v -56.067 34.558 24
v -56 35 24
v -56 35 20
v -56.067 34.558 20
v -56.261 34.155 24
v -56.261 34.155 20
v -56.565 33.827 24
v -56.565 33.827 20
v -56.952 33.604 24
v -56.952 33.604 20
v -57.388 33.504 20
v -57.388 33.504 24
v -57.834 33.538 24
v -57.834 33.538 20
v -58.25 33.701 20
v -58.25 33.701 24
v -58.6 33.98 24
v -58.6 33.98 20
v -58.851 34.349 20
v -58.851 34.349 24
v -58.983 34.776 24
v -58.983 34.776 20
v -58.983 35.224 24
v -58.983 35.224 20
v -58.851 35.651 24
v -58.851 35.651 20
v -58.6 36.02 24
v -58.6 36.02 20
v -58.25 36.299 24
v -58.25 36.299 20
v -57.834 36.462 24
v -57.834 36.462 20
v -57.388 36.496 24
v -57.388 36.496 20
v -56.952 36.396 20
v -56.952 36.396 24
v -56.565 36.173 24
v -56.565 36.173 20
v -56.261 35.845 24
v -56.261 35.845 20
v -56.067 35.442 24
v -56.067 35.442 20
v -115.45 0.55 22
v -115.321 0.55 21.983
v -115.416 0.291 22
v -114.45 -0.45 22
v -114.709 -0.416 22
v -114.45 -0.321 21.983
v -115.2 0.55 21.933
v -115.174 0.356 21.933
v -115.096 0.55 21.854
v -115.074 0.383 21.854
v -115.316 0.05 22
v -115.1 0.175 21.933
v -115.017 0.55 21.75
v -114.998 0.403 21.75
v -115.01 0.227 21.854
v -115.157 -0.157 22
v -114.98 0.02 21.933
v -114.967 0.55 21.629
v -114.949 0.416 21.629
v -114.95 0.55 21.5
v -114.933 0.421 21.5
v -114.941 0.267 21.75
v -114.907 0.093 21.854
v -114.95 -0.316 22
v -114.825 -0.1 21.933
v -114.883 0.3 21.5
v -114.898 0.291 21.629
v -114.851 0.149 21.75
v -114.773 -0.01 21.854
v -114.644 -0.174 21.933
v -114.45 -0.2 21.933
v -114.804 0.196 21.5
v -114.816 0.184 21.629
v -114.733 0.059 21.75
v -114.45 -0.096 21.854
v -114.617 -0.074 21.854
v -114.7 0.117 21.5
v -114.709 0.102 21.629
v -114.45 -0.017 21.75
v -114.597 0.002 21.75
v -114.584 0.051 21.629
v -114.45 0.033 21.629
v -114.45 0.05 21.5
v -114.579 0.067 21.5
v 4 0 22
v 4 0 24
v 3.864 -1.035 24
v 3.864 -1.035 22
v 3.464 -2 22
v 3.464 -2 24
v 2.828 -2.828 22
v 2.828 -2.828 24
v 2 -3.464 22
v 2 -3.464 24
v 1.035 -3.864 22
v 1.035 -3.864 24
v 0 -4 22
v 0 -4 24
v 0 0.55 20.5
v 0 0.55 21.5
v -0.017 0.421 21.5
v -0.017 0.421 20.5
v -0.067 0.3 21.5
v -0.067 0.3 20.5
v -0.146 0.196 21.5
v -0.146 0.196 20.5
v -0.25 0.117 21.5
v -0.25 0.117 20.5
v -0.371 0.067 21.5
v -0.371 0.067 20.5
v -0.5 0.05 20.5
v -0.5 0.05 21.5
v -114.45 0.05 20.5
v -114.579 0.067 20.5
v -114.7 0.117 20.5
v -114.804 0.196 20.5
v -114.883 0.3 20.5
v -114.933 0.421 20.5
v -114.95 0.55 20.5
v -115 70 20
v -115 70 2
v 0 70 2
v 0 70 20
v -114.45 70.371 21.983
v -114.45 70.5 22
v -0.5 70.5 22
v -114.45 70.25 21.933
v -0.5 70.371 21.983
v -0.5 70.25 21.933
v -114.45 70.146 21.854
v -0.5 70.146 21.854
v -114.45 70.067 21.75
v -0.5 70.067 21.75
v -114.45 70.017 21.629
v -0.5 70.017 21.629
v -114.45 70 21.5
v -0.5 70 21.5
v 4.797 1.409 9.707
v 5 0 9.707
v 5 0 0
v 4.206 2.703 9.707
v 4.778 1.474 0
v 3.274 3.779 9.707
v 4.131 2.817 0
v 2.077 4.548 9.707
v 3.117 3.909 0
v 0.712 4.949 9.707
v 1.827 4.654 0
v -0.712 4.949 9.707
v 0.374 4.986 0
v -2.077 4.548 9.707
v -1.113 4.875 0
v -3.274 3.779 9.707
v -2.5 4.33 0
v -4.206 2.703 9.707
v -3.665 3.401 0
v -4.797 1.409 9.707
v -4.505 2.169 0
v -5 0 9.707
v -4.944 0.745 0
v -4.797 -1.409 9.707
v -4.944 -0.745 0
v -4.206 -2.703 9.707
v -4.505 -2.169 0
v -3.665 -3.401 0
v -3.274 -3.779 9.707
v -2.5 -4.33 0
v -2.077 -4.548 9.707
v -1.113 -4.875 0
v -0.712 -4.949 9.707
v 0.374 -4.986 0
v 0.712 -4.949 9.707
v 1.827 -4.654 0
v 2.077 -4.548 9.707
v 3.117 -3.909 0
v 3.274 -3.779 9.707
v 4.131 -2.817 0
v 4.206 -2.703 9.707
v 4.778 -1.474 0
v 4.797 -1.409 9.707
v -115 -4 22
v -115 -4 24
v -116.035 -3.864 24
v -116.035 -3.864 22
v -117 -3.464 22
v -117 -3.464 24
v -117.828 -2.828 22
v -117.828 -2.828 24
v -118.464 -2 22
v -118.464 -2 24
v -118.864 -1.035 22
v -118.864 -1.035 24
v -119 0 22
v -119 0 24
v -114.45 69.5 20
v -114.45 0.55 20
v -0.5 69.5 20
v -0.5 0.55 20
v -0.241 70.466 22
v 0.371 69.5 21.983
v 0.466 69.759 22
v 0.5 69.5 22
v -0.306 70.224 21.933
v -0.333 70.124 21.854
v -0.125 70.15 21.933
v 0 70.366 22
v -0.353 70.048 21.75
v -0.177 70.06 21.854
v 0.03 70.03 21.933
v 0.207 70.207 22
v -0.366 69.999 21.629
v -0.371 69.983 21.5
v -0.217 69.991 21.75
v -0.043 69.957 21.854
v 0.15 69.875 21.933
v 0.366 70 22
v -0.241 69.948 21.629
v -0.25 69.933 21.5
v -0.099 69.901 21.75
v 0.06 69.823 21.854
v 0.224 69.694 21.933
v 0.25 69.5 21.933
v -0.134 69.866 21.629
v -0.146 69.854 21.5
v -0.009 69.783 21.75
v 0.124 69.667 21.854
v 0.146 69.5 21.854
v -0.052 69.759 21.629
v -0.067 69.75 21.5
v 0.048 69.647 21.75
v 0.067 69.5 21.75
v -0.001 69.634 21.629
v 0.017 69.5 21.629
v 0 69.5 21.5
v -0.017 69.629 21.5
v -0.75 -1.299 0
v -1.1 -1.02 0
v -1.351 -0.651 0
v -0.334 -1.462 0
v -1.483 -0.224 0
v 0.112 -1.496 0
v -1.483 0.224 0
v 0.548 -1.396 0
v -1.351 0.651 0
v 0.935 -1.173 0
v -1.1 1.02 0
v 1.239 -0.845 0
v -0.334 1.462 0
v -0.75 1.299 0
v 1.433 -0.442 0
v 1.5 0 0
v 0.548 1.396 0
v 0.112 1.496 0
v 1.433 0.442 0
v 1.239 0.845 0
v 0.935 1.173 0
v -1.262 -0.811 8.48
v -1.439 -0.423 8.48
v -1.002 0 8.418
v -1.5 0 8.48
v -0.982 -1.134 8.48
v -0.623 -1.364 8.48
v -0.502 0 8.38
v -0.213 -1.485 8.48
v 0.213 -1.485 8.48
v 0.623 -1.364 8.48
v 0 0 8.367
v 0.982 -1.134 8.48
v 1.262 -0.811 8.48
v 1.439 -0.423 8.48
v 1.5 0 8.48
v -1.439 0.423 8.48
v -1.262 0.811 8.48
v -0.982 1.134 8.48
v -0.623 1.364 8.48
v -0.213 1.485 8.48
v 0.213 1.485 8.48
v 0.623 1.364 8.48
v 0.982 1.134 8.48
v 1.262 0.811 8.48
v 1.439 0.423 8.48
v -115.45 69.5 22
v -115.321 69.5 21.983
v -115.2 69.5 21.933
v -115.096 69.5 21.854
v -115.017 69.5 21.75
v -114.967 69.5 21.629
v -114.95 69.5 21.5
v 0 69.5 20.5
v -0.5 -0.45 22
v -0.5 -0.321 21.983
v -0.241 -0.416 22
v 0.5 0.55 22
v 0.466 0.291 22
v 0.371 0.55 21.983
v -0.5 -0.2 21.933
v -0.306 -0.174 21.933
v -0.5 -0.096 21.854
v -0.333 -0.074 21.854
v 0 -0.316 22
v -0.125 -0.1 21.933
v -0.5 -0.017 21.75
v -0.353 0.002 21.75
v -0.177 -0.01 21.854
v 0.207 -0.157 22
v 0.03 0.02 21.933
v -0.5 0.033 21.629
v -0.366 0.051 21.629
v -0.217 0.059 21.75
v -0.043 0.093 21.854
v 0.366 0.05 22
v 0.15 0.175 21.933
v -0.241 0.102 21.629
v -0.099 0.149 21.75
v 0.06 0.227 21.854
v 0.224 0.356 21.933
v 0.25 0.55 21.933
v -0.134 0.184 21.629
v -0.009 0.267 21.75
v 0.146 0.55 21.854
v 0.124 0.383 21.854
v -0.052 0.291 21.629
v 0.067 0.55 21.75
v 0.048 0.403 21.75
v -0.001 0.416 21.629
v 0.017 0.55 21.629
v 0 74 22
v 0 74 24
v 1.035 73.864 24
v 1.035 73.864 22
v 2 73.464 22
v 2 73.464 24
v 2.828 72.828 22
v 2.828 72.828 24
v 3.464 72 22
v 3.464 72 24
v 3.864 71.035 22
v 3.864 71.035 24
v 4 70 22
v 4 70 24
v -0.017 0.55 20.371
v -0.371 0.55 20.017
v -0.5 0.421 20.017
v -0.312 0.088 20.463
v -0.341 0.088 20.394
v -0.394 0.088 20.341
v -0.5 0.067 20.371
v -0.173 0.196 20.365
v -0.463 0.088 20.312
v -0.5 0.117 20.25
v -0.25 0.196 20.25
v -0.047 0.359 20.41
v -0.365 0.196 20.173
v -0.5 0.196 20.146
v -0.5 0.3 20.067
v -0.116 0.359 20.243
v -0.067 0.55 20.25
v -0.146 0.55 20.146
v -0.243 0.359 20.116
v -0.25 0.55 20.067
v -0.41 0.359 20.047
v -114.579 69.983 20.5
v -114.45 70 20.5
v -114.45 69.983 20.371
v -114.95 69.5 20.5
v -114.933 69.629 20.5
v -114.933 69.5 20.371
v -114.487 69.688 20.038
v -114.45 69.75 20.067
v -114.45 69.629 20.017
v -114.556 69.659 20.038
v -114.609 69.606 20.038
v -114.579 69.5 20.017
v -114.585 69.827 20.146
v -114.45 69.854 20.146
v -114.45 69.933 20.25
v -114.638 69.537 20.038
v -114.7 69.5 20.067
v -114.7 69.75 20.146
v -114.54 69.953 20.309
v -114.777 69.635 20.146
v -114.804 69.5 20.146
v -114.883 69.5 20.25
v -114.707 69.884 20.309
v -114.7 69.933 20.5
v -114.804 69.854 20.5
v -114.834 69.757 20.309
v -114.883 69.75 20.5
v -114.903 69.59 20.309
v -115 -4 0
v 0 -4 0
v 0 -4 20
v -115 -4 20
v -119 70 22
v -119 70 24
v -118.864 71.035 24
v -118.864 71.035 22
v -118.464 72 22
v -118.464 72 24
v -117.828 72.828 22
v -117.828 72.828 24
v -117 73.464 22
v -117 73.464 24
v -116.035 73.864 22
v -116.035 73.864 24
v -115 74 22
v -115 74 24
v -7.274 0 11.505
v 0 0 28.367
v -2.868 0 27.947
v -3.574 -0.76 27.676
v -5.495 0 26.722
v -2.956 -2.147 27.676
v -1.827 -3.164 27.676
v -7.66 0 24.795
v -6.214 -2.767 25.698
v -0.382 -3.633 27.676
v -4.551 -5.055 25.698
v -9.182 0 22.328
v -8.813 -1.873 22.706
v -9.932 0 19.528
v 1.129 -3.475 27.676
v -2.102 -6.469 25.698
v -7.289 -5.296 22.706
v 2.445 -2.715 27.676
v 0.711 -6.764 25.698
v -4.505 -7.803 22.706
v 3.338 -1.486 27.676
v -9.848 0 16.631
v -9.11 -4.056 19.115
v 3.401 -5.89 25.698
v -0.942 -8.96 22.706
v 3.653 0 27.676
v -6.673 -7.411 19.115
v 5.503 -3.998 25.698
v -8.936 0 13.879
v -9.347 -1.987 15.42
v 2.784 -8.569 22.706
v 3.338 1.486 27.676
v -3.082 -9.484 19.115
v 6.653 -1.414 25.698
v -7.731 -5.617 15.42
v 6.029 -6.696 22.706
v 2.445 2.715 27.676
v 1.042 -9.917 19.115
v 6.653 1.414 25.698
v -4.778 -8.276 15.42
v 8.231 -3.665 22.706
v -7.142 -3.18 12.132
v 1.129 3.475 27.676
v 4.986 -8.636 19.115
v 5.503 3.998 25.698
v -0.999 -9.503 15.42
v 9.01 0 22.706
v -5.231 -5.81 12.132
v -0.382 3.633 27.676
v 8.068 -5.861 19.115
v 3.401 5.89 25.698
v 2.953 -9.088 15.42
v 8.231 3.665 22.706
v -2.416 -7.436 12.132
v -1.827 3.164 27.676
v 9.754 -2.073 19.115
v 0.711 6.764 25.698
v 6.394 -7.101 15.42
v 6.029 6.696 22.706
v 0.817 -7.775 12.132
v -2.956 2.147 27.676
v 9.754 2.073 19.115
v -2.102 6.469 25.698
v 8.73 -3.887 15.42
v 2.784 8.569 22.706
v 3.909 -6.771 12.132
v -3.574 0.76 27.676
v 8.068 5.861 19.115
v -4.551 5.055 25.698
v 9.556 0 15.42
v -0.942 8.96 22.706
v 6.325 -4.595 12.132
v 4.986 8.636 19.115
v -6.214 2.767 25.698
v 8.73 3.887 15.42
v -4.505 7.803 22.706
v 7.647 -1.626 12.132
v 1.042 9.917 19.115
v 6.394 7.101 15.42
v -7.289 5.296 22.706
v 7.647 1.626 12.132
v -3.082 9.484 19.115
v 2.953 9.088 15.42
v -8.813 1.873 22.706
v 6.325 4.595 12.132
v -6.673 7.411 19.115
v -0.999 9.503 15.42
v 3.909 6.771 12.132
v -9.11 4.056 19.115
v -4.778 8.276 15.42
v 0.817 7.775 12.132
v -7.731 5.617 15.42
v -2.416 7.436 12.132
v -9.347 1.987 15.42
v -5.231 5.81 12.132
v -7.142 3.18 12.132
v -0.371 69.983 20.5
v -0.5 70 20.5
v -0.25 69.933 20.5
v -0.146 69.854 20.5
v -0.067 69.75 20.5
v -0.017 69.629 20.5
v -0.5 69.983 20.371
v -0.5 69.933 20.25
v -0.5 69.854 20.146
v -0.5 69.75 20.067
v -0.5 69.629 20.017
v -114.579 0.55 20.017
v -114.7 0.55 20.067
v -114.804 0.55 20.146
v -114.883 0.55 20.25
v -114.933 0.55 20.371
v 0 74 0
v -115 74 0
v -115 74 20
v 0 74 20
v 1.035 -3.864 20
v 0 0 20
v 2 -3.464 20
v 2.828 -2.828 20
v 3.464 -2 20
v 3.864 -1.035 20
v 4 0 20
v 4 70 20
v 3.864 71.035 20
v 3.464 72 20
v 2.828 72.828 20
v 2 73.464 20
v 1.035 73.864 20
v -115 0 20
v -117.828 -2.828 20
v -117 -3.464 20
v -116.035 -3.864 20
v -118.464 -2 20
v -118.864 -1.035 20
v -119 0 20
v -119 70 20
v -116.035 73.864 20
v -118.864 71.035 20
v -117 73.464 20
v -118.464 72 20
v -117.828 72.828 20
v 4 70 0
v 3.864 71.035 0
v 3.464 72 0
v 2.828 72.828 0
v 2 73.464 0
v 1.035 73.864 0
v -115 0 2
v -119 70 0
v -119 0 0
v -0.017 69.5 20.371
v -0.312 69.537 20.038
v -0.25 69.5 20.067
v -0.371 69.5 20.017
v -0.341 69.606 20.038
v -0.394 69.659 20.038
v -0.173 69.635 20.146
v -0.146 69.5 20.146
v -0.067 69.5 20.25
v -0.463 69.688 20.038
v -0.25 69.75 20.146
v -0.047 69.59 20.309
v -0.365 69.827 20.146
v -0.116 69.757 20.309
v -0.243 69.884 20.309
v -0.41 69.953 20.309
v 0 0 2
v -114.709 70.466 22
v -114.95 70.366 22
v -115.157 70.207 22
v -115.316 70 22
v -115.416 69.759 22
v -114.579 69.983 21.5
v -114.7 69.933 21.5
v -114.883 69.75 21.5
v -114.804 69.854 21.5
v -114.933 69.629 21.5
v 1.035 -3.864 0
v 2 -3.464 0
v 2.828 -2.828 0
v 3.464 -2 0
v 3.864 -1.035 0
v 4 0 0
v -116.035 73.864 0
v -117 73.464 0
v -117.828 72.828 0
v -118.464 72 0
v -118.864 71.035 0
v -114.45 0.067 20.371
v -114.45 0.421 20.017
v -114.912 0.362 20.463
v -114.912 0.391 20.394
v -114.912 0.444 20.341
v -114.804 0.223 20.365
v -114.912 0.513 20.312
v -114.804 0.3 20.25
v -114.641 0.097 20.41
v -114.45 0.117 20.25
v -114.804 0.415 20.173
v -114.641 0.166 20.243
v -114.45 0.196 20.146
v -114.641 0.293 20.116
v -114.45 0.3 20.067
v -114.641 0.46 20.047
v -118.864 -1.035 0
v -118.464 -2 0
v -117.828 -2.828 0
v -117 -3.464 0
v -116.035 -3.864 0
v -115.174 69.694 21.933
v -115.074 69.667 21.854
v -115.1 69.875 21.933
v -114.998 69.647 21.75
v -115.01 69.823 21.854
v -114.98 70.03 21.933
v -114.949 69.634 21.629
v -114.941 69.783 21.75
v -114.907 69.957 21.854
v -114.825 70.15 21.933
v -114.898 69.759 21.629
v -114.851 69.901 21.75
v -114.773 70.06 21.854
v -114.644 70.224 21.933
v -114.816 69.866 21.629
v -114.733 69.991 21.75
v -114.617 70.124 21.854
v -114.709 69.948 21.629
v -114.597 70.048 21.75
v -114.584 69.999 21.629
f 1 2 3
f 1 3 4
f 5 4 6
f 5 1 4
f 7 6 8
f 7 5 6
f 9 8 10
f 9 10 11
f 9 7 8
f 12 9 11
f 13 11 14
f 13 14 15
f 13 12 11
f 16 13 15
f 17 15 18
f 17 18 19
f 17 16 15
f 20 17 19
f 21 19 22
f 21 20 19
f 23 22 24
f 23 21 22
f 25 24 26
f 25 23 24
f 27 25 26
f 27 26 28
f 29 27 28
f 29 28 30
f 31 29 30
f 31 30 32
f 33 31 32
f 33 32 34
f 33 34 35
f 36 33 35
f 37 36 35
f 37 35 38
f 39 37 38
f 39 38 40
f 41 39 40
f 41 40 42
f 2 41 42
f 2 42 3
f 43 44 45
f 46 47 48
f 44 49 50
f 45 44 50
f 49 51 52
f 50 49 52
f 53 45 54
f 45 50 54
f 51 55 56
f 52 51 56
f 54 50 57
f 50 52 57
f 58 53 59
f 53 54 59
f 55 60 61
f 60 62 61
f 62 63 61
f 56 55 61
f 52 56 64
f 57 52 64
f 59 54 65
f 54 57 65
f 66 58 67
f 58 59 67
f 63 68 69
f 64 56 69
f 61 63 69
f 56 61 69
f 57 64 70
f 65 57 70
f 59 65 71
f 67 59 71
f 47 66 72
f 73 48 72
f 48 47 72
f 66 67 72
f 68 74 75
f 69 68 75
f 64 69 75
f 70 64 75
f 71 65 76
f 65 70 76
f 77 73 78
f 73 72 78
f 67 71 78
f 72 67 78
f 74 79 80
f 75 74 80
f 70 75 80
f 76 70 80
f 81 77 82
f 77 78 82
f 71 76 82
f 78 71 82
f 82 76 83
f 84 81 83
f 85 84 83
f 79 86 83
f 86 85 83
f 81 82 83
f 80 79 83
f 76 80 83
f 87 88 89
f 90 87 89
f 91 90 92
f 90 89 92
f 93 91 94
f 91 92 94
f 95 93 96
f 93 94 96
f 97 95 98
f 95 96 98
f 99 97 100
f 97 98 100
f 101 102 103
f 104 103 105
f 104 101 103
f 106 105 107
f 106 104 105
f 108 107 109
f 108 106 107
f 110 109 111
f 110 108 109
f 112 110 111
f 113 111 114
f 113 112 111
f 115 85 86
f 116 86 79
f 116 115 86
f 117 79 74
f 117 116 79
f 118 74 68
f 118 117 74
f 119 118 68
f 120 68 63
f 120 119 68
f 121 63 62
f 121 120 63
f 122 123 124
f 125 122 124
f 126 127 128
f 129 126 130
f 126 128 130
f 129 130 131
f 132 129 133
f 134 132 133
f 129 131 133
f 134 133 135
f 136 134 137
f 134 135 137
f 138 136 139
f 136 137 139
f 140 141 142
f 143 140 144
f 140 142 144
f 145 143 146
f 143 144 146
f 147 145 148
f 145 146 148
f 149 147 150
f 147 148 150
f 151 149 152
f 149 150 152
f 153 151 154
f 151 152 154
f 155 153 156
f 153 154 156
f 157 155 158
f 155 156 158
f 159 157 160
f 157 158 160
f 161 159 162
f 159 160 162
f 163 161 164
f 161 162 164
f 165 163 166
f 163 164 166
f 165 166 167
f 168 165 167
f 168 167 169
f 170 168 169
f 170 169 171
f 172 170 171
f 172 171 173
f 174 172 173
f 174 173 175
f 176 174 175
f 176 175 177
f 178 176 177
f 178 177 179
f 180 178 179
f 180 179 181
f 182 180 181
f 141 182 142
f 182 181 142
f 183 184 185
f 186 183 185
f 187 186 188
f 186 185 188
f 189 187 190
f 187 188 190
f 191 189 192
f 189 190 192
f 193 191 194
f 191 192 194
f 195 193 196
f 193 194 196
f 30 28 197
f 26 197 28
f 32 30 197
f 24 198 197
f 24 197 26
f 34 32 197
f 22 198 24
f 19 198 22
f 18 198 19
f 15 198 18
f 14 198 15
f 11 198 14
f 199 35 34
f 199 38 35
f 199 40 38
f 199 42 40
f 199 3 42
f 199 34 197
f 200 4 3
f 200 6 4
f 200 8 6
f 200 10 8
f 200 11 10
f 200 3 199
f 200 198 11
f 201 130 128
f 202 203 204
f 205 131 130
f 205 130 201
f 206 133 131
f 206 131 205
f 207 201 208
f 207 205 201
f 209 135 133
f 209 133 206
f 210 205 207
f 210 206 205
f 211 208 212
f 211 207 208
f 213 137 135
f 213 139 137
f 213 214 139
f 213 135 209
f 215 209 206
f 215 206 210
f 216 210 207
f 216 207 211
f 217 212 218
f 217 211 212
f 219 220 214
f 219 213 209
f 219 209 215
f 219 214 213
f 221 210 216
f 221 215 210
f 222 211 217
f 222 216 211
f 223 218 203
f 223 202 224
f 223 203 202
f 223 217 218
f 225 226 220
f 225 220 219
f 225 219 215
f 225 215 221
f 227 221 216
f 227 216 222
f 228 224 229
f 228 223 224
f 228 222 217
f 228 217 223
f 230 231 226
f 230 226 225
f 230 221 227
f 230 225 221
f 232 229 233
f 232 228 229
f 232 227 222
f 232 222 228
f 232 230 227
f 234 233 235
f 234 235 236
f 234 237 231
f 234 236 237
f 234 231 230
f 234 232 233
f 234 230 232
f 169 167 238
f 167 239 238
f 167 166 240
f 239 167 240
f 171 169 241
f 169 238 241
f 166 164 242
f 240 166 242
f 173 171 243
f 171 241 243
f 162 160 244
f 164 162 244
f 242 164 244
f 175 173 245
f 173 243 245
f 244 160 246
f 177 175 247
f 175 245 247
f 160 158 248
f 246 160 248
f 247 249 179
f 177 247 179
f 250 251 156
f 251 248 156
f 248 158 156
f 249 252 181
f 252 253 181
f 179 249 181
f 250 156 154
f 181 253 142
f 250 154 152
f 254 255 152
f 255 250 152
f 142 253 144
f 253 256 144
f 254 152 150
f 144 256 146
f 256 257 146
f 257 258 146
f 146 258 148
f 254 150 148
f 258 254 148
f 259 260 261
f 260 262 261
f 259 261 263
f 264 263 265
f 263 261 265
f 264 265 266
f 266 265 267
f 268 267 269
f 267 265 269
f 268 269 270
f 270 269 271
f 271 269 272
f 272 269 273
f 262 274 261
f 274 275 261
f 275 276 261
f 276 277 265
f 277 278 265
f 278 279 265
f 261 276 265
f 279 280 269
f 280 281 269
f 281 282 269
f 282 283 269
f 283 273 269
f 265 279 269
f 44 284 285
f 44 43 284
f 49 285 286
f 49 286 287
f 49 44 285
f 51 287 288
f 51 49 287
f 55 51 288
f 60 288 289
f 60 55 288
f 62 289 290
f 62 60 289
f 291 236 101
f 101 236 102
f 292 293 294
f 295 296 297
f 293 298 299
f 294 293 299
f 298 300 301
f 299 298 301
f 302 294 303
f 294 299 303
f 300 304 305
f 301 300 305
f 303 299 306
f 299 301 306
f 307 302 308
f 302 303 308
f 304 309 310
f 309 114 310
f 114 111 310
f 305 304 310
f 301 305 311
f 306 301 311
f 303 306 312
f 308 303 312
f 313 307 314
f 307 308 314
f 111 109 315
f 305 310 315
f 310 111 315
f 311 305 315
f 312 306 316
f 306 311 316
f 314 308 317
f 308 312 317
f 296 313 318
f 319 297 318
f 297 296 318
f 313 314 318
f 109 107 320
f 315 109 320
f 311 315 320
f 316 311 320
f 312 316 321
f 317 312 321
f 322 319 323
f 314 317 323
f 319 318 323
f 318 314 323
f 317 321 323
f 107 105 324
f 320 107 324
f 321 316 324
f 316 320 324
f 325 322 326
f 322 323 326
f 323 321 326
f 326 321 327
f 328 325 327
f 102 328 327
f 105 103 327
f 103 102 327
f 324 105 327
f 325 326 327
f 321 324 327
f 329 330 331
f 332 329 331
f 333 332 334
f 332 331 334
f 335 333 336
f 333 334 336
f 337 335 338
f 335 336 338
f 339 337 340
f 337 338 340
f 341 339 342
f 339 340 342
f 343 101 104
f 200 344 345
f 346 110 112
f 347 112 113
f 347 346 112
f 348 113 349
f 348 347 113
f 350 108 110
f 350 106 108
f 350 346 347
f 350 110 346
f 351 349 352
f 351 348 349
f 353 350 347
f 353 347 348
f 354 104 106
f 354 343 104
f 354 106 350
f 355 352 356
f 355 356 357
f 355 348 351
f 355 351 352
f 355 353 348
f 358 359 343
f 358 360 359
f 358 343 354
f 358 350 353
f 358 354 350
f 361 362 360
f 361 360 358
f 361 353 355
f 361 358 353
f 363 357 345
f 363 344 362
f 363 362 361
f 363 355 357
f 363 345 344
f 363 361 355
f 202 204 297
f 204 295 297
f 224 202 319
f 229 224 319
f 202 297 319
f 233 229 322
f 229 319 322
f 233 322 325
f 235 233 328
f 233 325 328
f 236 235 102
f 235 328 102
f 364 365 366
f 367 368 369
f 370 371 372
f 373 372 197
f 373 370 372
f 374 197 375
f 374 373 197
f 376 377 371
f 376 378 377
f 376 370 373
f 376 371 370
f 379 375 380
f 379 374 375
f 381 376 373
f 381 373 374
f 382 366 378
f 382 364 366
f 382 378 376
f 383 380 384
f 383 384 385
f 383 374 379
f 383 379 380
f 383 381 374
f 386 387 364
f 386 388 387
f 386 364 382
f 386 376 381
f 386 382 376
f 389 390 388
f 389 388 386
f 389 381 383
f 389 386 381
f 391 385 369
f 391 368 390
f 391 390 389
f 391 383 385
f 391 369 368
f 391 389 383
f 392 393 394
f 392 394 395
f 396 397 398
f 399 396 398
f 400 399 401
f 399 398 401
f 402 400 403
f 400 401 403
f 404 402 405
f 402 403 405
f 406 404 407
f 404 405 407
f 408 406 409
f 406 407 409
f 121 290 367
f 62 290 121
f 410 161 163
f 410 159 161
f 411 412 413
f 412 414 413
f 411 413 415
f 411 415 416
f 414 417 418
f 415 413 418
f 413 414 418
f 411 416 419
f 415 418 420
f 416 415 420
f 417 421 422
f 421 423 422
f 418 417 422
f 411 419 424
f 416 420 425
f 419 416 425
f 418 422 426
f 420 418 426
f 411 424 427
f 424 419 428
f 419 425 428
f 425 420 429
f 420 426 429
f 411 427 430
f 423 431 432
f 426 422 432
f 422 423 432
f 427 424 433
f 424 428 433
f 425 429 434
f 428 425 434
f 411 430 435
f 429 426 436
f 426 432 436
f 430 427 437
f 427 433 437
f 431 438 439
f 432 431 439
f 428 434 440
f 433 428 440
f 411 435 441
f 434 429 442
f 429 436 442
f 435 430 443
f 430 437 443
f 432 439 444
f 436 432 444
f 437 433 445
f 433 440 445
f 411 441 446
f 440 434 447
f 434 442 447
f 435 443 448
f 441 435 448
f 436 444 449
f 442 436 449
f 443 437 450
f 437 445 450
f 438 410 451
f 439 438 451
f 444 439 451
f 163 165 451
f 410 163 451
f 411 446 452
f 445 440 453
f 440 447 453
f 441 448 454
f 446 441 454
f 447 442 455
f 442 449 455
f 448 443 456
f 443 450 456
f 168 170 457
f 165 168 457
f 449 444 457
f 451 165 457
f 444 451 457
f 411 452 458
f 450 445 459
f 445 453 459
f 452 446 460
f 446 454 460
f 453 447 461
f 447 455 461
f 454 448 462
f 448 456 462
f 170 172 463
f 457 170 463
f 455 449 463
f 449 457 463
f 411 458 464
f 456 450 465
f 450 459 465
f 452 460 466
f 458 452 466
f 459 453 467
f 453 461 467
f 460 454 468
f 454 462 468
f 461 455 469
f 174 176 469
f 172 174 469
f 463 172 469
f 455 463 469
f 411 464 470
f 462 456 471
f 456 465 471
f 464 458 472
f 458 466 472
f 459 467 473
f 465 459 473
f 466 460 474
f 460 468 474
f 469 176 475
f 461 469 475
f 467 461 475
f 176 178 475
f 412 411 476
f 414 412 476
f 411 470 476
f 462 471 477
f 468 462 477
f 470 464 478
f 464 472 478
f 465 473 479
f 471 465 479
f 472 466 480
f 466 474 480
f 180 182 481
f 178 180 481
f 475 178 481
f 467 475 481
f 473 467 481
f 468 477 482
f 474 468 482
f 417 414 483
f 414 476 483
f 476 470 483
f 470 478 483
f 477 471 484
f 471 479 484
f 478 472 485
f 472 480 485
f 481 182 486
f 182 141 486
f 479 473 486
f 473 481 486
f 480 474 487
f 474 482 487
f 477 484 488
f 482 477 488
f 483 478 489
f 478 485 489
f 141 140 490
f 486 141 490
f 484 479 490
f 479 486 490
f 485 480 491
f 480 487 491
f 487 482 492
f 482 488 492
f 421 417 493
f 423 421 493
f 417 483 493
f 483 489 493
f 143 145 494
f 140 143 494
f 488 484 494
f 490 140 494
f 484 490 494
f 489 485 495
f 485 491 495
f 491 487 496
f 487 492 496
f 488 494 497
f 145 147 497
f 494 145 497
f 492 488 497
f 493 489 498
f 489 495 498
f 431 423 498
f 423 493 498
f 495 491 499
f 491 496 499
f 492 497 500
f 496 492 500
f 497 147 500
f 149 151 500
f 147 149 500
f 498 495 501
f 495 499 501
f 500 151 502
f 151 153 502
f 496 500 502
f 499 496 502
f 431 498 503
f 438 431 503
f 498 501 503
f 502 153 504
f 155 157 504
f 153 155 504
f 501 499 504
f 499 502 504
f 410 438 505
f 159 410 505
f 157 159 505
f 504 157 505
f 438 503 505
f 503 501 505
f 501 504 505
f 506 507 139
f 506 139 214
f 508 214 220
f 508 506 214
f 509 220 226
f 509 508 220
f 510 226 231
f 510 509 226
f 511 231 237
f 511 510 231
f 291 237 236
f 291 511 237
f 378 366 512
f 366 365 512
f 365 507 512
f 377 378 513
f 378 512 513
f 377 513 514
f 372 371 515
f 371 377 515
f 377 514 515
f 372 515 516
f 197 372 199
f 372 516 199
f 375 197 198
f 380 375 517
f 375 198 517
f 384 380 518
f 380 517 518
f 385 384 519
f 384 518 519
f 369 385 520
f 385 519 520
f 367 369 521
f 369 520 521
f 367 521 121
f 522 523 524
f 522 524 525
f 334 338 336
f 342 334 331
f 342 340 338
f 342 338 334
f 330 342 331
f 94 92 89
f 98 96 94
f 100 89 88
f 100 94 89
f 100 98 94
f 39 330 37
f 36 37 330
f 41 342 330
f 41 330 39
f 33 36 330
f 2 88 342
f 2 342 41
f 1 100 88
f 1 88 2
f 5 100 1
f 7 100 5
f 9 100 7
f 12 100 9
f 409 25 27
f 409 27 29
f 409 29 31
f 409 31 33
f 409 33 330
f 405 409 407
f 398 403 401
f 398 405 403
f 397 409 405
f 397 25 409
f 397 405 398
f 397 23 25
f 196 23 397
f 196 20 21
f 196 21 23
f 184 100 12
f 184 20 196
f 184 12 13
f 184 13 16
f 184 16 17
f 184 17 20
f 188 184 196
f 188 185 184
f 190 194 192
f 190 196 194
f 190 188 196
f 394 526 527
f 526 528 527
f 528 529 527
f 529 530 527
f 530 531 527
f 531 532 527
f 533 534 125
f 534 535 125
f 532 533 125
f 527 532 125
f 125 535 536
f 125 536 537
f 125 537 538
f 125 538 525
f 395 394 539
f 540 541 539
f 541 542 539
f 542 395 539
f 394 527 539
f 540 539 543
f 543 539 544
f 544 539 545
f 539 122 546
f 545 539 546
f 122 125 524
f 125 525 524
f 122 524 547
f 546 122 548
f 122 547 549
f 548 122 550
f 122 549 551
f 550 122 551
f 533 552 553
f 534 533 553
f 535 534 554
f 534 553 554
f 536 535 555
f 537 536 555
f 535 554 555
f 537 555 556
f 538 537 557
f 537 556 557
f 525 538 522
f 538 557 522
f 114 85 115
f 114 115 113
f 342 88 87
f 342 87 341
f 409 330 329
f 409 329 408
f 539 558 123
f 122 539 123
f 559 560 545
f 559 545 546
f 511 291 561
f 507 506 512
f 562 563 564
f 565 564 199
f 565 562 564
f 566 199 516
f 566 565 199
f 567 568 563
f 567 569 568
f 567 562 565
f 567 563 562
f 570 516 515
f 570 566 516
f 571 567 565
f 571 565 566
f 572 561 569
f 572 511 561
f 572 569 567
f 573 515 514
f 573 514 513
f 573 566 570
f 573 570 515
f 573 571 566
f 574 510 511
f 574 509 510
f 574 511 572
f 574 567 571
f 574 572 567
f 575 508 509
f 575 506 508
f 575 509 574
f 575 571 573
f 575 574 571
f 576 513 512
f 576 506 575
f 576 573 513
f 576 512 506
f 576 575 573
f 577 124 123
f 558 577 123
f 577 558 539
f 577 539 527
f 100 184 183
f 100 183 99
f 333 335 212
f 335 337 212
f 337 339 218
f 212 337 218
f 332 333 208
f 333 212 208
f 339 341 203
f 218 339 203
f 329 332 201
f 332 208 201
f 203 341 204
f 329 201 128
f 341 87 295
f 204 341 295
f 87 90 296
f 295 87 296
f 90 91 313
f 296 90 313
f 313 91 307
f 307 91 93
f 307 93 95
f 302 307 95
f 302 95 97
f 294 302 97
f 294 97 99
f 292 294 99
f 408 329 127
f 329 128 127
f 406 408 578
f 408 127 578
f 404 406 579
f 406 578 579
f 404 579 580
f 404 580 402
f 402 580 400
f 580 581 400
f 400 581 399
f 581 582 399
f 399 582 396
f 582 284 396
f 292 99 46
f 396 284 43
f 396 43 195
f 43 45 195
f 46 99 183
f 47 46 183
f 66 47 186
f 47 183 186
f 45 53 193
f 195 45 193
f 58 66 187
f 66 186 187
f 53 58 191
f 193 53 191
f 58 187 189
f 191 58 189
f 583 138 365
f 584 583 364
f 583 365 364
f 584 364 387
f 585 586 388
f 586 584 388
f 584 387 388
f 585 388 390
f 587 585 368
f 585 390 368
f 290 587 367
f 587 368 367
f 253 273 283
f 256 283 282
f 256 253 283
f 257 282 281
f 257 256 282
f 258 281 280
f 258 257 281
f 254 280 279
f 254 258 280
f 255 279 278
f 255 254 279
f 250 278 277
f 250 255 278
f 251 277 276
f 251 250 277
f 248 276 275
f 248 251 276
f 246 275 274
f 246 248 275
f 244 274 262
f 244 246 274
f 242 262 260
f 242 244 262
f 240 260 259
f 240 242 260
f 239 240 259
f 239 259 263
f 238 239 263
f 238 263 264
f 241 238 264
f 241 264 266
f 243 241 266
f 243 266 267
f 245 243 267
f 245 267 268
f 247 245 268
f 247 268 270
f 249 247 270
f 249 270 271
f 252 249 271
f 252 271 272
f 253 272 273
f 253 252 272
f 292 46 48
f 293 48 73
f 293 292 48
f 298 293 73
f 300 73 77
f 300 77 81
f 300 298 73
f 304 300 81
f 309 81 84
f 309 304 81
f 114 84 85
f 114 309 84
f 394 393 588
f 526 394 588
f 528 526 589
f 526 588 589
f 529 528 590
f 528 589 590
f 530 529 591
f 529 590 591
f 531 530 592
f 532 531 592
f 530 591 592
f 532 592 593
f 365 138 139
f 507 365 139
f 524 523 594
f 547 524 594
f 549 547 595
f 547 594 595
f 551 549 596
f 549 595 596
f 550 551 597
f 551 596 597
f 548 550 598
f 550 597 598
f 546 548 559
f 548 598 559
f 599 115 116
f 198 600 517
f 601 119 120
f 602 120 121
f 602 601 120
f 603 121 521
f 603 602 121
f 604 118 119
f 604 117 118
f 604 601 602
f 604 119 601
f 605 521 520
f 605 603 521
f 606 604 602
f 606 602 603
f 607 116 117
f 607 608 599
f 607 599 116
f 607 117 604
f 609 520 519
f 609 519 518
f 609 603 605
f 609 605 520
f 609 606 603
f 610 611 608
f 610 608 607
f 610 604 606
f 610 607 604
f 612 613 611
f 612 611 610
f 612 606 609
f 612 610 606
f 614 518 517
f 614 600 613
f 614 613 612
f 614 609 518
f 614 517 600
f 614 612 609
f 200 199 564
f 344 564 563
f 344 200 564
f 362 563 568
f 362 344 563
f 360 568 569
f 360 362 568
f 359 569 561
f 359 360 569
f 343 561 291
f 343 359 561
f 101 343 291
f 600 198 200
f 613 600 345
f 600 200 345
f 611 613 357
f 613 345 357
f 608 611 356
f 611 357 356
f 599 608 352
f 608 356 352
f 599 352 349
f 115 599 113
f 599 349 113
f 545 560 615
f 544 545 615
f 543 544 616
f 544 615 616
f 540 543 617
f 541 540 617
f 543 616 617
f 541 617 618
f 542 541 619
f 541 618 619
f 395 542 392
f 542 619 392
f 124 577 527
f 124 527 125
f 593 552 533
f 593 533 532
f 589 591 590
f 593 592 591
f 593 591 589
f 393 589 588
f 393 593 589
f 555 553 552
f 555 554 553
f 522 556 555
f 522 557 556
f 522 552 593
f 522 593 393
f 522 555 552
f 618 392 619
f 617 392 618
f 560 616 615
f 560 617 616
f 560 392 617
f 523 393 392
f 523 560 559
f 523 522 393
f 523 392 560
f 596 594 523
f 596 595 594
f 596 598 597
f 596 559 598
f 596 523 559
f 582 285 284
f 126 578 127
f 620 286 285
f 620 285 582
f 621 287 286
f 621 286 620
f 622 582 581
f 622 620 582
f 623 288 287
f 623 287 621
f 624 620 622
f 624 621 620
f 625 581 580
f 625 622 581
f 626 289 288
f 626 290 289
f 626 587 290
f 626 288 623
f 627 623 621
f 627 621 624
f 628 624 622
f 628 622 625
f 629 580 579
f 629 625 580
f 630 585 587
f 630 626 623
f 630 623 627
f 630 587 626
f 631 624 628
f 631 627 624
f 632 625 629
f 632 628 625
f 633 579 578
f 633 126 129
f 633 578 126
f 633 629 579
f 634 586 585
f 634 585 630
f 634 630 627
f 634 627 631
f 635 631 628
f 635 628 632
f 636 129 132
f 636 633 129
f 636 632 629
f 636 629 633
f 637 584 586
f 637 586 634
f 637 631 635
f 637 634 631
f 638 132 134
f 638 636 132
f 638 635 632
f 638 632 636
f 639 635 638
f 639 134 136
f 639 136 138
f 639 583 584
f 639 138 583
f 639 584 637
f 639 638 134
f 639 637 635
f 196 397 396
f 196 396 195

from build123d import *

# Parameters (mm, degrees)
SKETCH_W                = 115
SKETCH_H                = 70
PAD_DEPTH               = 20
PAD001_DEPTH            = 2
SKETCH002_R             = 1.5
PAD002_DEPTH            = 2
SKETCH003_W             = 114.95
SKETCH003_H             = 69.95
SKETCH003_R             = 1.5
PAD003_DEPTH            = 4
FILLET_R                = 0.5
BODY001_PLACEMENT_ANGLE = 180
SKETCH004_R             = 5
SKETCH004_R_2           = 1.5
PAD004_DEPTH            = 10


with BuildPart() as body:
    # Sketch → Pad (new body)
    with BuildSketch(Plane.XY):
        with BuildLine():
            Line((-115, 74), (0, 74))
            ThreePointArc((4, 70), (2.828427, 72.828427), (0, 74))
            Line((4, 70), (4, 0))
            ThreePointArc((0, -4), (2.828427, -2.828427), (4, 0))
            Line((0, -4), (-115, -4))
            ThreePointArc((-119, 0), (-117.828427, -2.828427), (-115, -4))
            Line((-119, 0), (-119, 70))
            ThreePointArc((-115, 74), (-117.828427, 72.828427), (-119, 70))
        make_face()
        with Locations((-57.5, 35)):
            Rectangle(SKETCH_W, SKETCH_H, mode=Mode.SUBTRACT)
    extrude(amount=PAD_DEPTH)

    # Sketch001 → Pad001 (join)
    with BuildSketch(Plane.XY):
        with BuildLine():
            Line((-115, 74), (0, 74))
            ThreePointArc((4, 70), (2.828427, 72.828427), (0, 74))
            Line((4, 70), (4, 0))
            ThreePointArc((0, -4), (2.828427, -2.828427), (4, 0))
            Line((0, -4), (-115, -4))
            ThreePointArc((-119, 0), (-117.828427, -2.828427), (-115, -4))
            Line((-119, 0), (-119, 70))
            ThreePointArc((-115, 74), (-117.828427, 72.828427), (-119, 70))
        make_face()
    extrude(amount=PAD001_DEPTH)


with BuildPart() as body001cover:
    # Sketch002 → Pad002 (new body)
    with BuildSketch(Plane.XY):
        with BuildLine():
            Line((-115, 74), (0, 74))
            ThreePointArc((4, 70), (2.828427, 72.828427), (0, 74))
            Line((4, 70), (4, 0))
            ThreePointArc((0, -4), (2.828427, -2.828427), (4, 0))
            Line((0, -4), (-115, -4))
            ThreePointArc((-119, 0), (-117.828427, -2.828427), (-115, -4))
            Line((-119, 0), (-119, 70))
            ThreePointArc((-115, 74), (-117.828427, 72.828427), (-119, 70))
        make_face()
        with Locations((-57.5, 35)):
            Circle(SKETCH002_R, mode=Mode.SUBTRACT)
    extrude(amount=PAD002_DEPTH)

    # Sketch003 → Pad003 (join)
    with BuildSketch(Plane.XY):
        with Locations((-57.475, 34.975)):
            Rectangle(SKETCH003_W, SKETCH003_H)
        with Locations((-57.5, 35)):
            Circle(SKETCH003_R, mode=Mode.SUBTRACT)
    extrude(amount=PAD003_DEPTH)

    # Fillet
    fillet_edges = [body001cover.edges().sort_by_distance(p)[0] for p in [
        (0, 34.975, 2),
        (0, 0, 3),
        (0, 34.975, 4),
        (0, 69.95, 3),
        (-57.475, 69.95, 2),
        (-57.475, 69.95, 4),
        (-114.95, 69.95, 3),
        (-57.475, 0, 2),
        (-114.95, 0, 3),
        (-57.475, 0, 4),
        (-114.95, 34.975, 2),
        (-114.95, 34.975, 4),
    ]]
    fillet(fillet_edges, radius=FILLET_R)


with BuildPart() as body001cover_1:
    # Body001 placement: moved
    add(body001cover.part.moved(Location((0, 70, 24))).rotate(Axis((0, 70, 24), (1, 0, 0)), BODY001_PLACEMENT_ANGLE))


with BuildPart() as body002head:
    # Sketch004 → Pad004 (new body)
    with BuildSketch(Plane.XY):
        Circle(SKETCH004_R)
        Circle(SKETCH004_R_2, mode=Mode.SUBTRACT)
    extrude(amount=PAD004_DEPTH)

    # Sketch005 → Revolution (revolve)
    with BuildSketch(Plane.XZ):
        with BuildLine():
            Line((0, 28.36731), (0, 8.36731))
            ThreePointArc((0, 28.36731), (-10, 18.36731), (0, 8.36731))
        make_face()
    revolve(axis=Axis((0, 0, 0), (0, 0, 1)))


solid = Compound([body.part, body001cover_1.part, body002head.part])
